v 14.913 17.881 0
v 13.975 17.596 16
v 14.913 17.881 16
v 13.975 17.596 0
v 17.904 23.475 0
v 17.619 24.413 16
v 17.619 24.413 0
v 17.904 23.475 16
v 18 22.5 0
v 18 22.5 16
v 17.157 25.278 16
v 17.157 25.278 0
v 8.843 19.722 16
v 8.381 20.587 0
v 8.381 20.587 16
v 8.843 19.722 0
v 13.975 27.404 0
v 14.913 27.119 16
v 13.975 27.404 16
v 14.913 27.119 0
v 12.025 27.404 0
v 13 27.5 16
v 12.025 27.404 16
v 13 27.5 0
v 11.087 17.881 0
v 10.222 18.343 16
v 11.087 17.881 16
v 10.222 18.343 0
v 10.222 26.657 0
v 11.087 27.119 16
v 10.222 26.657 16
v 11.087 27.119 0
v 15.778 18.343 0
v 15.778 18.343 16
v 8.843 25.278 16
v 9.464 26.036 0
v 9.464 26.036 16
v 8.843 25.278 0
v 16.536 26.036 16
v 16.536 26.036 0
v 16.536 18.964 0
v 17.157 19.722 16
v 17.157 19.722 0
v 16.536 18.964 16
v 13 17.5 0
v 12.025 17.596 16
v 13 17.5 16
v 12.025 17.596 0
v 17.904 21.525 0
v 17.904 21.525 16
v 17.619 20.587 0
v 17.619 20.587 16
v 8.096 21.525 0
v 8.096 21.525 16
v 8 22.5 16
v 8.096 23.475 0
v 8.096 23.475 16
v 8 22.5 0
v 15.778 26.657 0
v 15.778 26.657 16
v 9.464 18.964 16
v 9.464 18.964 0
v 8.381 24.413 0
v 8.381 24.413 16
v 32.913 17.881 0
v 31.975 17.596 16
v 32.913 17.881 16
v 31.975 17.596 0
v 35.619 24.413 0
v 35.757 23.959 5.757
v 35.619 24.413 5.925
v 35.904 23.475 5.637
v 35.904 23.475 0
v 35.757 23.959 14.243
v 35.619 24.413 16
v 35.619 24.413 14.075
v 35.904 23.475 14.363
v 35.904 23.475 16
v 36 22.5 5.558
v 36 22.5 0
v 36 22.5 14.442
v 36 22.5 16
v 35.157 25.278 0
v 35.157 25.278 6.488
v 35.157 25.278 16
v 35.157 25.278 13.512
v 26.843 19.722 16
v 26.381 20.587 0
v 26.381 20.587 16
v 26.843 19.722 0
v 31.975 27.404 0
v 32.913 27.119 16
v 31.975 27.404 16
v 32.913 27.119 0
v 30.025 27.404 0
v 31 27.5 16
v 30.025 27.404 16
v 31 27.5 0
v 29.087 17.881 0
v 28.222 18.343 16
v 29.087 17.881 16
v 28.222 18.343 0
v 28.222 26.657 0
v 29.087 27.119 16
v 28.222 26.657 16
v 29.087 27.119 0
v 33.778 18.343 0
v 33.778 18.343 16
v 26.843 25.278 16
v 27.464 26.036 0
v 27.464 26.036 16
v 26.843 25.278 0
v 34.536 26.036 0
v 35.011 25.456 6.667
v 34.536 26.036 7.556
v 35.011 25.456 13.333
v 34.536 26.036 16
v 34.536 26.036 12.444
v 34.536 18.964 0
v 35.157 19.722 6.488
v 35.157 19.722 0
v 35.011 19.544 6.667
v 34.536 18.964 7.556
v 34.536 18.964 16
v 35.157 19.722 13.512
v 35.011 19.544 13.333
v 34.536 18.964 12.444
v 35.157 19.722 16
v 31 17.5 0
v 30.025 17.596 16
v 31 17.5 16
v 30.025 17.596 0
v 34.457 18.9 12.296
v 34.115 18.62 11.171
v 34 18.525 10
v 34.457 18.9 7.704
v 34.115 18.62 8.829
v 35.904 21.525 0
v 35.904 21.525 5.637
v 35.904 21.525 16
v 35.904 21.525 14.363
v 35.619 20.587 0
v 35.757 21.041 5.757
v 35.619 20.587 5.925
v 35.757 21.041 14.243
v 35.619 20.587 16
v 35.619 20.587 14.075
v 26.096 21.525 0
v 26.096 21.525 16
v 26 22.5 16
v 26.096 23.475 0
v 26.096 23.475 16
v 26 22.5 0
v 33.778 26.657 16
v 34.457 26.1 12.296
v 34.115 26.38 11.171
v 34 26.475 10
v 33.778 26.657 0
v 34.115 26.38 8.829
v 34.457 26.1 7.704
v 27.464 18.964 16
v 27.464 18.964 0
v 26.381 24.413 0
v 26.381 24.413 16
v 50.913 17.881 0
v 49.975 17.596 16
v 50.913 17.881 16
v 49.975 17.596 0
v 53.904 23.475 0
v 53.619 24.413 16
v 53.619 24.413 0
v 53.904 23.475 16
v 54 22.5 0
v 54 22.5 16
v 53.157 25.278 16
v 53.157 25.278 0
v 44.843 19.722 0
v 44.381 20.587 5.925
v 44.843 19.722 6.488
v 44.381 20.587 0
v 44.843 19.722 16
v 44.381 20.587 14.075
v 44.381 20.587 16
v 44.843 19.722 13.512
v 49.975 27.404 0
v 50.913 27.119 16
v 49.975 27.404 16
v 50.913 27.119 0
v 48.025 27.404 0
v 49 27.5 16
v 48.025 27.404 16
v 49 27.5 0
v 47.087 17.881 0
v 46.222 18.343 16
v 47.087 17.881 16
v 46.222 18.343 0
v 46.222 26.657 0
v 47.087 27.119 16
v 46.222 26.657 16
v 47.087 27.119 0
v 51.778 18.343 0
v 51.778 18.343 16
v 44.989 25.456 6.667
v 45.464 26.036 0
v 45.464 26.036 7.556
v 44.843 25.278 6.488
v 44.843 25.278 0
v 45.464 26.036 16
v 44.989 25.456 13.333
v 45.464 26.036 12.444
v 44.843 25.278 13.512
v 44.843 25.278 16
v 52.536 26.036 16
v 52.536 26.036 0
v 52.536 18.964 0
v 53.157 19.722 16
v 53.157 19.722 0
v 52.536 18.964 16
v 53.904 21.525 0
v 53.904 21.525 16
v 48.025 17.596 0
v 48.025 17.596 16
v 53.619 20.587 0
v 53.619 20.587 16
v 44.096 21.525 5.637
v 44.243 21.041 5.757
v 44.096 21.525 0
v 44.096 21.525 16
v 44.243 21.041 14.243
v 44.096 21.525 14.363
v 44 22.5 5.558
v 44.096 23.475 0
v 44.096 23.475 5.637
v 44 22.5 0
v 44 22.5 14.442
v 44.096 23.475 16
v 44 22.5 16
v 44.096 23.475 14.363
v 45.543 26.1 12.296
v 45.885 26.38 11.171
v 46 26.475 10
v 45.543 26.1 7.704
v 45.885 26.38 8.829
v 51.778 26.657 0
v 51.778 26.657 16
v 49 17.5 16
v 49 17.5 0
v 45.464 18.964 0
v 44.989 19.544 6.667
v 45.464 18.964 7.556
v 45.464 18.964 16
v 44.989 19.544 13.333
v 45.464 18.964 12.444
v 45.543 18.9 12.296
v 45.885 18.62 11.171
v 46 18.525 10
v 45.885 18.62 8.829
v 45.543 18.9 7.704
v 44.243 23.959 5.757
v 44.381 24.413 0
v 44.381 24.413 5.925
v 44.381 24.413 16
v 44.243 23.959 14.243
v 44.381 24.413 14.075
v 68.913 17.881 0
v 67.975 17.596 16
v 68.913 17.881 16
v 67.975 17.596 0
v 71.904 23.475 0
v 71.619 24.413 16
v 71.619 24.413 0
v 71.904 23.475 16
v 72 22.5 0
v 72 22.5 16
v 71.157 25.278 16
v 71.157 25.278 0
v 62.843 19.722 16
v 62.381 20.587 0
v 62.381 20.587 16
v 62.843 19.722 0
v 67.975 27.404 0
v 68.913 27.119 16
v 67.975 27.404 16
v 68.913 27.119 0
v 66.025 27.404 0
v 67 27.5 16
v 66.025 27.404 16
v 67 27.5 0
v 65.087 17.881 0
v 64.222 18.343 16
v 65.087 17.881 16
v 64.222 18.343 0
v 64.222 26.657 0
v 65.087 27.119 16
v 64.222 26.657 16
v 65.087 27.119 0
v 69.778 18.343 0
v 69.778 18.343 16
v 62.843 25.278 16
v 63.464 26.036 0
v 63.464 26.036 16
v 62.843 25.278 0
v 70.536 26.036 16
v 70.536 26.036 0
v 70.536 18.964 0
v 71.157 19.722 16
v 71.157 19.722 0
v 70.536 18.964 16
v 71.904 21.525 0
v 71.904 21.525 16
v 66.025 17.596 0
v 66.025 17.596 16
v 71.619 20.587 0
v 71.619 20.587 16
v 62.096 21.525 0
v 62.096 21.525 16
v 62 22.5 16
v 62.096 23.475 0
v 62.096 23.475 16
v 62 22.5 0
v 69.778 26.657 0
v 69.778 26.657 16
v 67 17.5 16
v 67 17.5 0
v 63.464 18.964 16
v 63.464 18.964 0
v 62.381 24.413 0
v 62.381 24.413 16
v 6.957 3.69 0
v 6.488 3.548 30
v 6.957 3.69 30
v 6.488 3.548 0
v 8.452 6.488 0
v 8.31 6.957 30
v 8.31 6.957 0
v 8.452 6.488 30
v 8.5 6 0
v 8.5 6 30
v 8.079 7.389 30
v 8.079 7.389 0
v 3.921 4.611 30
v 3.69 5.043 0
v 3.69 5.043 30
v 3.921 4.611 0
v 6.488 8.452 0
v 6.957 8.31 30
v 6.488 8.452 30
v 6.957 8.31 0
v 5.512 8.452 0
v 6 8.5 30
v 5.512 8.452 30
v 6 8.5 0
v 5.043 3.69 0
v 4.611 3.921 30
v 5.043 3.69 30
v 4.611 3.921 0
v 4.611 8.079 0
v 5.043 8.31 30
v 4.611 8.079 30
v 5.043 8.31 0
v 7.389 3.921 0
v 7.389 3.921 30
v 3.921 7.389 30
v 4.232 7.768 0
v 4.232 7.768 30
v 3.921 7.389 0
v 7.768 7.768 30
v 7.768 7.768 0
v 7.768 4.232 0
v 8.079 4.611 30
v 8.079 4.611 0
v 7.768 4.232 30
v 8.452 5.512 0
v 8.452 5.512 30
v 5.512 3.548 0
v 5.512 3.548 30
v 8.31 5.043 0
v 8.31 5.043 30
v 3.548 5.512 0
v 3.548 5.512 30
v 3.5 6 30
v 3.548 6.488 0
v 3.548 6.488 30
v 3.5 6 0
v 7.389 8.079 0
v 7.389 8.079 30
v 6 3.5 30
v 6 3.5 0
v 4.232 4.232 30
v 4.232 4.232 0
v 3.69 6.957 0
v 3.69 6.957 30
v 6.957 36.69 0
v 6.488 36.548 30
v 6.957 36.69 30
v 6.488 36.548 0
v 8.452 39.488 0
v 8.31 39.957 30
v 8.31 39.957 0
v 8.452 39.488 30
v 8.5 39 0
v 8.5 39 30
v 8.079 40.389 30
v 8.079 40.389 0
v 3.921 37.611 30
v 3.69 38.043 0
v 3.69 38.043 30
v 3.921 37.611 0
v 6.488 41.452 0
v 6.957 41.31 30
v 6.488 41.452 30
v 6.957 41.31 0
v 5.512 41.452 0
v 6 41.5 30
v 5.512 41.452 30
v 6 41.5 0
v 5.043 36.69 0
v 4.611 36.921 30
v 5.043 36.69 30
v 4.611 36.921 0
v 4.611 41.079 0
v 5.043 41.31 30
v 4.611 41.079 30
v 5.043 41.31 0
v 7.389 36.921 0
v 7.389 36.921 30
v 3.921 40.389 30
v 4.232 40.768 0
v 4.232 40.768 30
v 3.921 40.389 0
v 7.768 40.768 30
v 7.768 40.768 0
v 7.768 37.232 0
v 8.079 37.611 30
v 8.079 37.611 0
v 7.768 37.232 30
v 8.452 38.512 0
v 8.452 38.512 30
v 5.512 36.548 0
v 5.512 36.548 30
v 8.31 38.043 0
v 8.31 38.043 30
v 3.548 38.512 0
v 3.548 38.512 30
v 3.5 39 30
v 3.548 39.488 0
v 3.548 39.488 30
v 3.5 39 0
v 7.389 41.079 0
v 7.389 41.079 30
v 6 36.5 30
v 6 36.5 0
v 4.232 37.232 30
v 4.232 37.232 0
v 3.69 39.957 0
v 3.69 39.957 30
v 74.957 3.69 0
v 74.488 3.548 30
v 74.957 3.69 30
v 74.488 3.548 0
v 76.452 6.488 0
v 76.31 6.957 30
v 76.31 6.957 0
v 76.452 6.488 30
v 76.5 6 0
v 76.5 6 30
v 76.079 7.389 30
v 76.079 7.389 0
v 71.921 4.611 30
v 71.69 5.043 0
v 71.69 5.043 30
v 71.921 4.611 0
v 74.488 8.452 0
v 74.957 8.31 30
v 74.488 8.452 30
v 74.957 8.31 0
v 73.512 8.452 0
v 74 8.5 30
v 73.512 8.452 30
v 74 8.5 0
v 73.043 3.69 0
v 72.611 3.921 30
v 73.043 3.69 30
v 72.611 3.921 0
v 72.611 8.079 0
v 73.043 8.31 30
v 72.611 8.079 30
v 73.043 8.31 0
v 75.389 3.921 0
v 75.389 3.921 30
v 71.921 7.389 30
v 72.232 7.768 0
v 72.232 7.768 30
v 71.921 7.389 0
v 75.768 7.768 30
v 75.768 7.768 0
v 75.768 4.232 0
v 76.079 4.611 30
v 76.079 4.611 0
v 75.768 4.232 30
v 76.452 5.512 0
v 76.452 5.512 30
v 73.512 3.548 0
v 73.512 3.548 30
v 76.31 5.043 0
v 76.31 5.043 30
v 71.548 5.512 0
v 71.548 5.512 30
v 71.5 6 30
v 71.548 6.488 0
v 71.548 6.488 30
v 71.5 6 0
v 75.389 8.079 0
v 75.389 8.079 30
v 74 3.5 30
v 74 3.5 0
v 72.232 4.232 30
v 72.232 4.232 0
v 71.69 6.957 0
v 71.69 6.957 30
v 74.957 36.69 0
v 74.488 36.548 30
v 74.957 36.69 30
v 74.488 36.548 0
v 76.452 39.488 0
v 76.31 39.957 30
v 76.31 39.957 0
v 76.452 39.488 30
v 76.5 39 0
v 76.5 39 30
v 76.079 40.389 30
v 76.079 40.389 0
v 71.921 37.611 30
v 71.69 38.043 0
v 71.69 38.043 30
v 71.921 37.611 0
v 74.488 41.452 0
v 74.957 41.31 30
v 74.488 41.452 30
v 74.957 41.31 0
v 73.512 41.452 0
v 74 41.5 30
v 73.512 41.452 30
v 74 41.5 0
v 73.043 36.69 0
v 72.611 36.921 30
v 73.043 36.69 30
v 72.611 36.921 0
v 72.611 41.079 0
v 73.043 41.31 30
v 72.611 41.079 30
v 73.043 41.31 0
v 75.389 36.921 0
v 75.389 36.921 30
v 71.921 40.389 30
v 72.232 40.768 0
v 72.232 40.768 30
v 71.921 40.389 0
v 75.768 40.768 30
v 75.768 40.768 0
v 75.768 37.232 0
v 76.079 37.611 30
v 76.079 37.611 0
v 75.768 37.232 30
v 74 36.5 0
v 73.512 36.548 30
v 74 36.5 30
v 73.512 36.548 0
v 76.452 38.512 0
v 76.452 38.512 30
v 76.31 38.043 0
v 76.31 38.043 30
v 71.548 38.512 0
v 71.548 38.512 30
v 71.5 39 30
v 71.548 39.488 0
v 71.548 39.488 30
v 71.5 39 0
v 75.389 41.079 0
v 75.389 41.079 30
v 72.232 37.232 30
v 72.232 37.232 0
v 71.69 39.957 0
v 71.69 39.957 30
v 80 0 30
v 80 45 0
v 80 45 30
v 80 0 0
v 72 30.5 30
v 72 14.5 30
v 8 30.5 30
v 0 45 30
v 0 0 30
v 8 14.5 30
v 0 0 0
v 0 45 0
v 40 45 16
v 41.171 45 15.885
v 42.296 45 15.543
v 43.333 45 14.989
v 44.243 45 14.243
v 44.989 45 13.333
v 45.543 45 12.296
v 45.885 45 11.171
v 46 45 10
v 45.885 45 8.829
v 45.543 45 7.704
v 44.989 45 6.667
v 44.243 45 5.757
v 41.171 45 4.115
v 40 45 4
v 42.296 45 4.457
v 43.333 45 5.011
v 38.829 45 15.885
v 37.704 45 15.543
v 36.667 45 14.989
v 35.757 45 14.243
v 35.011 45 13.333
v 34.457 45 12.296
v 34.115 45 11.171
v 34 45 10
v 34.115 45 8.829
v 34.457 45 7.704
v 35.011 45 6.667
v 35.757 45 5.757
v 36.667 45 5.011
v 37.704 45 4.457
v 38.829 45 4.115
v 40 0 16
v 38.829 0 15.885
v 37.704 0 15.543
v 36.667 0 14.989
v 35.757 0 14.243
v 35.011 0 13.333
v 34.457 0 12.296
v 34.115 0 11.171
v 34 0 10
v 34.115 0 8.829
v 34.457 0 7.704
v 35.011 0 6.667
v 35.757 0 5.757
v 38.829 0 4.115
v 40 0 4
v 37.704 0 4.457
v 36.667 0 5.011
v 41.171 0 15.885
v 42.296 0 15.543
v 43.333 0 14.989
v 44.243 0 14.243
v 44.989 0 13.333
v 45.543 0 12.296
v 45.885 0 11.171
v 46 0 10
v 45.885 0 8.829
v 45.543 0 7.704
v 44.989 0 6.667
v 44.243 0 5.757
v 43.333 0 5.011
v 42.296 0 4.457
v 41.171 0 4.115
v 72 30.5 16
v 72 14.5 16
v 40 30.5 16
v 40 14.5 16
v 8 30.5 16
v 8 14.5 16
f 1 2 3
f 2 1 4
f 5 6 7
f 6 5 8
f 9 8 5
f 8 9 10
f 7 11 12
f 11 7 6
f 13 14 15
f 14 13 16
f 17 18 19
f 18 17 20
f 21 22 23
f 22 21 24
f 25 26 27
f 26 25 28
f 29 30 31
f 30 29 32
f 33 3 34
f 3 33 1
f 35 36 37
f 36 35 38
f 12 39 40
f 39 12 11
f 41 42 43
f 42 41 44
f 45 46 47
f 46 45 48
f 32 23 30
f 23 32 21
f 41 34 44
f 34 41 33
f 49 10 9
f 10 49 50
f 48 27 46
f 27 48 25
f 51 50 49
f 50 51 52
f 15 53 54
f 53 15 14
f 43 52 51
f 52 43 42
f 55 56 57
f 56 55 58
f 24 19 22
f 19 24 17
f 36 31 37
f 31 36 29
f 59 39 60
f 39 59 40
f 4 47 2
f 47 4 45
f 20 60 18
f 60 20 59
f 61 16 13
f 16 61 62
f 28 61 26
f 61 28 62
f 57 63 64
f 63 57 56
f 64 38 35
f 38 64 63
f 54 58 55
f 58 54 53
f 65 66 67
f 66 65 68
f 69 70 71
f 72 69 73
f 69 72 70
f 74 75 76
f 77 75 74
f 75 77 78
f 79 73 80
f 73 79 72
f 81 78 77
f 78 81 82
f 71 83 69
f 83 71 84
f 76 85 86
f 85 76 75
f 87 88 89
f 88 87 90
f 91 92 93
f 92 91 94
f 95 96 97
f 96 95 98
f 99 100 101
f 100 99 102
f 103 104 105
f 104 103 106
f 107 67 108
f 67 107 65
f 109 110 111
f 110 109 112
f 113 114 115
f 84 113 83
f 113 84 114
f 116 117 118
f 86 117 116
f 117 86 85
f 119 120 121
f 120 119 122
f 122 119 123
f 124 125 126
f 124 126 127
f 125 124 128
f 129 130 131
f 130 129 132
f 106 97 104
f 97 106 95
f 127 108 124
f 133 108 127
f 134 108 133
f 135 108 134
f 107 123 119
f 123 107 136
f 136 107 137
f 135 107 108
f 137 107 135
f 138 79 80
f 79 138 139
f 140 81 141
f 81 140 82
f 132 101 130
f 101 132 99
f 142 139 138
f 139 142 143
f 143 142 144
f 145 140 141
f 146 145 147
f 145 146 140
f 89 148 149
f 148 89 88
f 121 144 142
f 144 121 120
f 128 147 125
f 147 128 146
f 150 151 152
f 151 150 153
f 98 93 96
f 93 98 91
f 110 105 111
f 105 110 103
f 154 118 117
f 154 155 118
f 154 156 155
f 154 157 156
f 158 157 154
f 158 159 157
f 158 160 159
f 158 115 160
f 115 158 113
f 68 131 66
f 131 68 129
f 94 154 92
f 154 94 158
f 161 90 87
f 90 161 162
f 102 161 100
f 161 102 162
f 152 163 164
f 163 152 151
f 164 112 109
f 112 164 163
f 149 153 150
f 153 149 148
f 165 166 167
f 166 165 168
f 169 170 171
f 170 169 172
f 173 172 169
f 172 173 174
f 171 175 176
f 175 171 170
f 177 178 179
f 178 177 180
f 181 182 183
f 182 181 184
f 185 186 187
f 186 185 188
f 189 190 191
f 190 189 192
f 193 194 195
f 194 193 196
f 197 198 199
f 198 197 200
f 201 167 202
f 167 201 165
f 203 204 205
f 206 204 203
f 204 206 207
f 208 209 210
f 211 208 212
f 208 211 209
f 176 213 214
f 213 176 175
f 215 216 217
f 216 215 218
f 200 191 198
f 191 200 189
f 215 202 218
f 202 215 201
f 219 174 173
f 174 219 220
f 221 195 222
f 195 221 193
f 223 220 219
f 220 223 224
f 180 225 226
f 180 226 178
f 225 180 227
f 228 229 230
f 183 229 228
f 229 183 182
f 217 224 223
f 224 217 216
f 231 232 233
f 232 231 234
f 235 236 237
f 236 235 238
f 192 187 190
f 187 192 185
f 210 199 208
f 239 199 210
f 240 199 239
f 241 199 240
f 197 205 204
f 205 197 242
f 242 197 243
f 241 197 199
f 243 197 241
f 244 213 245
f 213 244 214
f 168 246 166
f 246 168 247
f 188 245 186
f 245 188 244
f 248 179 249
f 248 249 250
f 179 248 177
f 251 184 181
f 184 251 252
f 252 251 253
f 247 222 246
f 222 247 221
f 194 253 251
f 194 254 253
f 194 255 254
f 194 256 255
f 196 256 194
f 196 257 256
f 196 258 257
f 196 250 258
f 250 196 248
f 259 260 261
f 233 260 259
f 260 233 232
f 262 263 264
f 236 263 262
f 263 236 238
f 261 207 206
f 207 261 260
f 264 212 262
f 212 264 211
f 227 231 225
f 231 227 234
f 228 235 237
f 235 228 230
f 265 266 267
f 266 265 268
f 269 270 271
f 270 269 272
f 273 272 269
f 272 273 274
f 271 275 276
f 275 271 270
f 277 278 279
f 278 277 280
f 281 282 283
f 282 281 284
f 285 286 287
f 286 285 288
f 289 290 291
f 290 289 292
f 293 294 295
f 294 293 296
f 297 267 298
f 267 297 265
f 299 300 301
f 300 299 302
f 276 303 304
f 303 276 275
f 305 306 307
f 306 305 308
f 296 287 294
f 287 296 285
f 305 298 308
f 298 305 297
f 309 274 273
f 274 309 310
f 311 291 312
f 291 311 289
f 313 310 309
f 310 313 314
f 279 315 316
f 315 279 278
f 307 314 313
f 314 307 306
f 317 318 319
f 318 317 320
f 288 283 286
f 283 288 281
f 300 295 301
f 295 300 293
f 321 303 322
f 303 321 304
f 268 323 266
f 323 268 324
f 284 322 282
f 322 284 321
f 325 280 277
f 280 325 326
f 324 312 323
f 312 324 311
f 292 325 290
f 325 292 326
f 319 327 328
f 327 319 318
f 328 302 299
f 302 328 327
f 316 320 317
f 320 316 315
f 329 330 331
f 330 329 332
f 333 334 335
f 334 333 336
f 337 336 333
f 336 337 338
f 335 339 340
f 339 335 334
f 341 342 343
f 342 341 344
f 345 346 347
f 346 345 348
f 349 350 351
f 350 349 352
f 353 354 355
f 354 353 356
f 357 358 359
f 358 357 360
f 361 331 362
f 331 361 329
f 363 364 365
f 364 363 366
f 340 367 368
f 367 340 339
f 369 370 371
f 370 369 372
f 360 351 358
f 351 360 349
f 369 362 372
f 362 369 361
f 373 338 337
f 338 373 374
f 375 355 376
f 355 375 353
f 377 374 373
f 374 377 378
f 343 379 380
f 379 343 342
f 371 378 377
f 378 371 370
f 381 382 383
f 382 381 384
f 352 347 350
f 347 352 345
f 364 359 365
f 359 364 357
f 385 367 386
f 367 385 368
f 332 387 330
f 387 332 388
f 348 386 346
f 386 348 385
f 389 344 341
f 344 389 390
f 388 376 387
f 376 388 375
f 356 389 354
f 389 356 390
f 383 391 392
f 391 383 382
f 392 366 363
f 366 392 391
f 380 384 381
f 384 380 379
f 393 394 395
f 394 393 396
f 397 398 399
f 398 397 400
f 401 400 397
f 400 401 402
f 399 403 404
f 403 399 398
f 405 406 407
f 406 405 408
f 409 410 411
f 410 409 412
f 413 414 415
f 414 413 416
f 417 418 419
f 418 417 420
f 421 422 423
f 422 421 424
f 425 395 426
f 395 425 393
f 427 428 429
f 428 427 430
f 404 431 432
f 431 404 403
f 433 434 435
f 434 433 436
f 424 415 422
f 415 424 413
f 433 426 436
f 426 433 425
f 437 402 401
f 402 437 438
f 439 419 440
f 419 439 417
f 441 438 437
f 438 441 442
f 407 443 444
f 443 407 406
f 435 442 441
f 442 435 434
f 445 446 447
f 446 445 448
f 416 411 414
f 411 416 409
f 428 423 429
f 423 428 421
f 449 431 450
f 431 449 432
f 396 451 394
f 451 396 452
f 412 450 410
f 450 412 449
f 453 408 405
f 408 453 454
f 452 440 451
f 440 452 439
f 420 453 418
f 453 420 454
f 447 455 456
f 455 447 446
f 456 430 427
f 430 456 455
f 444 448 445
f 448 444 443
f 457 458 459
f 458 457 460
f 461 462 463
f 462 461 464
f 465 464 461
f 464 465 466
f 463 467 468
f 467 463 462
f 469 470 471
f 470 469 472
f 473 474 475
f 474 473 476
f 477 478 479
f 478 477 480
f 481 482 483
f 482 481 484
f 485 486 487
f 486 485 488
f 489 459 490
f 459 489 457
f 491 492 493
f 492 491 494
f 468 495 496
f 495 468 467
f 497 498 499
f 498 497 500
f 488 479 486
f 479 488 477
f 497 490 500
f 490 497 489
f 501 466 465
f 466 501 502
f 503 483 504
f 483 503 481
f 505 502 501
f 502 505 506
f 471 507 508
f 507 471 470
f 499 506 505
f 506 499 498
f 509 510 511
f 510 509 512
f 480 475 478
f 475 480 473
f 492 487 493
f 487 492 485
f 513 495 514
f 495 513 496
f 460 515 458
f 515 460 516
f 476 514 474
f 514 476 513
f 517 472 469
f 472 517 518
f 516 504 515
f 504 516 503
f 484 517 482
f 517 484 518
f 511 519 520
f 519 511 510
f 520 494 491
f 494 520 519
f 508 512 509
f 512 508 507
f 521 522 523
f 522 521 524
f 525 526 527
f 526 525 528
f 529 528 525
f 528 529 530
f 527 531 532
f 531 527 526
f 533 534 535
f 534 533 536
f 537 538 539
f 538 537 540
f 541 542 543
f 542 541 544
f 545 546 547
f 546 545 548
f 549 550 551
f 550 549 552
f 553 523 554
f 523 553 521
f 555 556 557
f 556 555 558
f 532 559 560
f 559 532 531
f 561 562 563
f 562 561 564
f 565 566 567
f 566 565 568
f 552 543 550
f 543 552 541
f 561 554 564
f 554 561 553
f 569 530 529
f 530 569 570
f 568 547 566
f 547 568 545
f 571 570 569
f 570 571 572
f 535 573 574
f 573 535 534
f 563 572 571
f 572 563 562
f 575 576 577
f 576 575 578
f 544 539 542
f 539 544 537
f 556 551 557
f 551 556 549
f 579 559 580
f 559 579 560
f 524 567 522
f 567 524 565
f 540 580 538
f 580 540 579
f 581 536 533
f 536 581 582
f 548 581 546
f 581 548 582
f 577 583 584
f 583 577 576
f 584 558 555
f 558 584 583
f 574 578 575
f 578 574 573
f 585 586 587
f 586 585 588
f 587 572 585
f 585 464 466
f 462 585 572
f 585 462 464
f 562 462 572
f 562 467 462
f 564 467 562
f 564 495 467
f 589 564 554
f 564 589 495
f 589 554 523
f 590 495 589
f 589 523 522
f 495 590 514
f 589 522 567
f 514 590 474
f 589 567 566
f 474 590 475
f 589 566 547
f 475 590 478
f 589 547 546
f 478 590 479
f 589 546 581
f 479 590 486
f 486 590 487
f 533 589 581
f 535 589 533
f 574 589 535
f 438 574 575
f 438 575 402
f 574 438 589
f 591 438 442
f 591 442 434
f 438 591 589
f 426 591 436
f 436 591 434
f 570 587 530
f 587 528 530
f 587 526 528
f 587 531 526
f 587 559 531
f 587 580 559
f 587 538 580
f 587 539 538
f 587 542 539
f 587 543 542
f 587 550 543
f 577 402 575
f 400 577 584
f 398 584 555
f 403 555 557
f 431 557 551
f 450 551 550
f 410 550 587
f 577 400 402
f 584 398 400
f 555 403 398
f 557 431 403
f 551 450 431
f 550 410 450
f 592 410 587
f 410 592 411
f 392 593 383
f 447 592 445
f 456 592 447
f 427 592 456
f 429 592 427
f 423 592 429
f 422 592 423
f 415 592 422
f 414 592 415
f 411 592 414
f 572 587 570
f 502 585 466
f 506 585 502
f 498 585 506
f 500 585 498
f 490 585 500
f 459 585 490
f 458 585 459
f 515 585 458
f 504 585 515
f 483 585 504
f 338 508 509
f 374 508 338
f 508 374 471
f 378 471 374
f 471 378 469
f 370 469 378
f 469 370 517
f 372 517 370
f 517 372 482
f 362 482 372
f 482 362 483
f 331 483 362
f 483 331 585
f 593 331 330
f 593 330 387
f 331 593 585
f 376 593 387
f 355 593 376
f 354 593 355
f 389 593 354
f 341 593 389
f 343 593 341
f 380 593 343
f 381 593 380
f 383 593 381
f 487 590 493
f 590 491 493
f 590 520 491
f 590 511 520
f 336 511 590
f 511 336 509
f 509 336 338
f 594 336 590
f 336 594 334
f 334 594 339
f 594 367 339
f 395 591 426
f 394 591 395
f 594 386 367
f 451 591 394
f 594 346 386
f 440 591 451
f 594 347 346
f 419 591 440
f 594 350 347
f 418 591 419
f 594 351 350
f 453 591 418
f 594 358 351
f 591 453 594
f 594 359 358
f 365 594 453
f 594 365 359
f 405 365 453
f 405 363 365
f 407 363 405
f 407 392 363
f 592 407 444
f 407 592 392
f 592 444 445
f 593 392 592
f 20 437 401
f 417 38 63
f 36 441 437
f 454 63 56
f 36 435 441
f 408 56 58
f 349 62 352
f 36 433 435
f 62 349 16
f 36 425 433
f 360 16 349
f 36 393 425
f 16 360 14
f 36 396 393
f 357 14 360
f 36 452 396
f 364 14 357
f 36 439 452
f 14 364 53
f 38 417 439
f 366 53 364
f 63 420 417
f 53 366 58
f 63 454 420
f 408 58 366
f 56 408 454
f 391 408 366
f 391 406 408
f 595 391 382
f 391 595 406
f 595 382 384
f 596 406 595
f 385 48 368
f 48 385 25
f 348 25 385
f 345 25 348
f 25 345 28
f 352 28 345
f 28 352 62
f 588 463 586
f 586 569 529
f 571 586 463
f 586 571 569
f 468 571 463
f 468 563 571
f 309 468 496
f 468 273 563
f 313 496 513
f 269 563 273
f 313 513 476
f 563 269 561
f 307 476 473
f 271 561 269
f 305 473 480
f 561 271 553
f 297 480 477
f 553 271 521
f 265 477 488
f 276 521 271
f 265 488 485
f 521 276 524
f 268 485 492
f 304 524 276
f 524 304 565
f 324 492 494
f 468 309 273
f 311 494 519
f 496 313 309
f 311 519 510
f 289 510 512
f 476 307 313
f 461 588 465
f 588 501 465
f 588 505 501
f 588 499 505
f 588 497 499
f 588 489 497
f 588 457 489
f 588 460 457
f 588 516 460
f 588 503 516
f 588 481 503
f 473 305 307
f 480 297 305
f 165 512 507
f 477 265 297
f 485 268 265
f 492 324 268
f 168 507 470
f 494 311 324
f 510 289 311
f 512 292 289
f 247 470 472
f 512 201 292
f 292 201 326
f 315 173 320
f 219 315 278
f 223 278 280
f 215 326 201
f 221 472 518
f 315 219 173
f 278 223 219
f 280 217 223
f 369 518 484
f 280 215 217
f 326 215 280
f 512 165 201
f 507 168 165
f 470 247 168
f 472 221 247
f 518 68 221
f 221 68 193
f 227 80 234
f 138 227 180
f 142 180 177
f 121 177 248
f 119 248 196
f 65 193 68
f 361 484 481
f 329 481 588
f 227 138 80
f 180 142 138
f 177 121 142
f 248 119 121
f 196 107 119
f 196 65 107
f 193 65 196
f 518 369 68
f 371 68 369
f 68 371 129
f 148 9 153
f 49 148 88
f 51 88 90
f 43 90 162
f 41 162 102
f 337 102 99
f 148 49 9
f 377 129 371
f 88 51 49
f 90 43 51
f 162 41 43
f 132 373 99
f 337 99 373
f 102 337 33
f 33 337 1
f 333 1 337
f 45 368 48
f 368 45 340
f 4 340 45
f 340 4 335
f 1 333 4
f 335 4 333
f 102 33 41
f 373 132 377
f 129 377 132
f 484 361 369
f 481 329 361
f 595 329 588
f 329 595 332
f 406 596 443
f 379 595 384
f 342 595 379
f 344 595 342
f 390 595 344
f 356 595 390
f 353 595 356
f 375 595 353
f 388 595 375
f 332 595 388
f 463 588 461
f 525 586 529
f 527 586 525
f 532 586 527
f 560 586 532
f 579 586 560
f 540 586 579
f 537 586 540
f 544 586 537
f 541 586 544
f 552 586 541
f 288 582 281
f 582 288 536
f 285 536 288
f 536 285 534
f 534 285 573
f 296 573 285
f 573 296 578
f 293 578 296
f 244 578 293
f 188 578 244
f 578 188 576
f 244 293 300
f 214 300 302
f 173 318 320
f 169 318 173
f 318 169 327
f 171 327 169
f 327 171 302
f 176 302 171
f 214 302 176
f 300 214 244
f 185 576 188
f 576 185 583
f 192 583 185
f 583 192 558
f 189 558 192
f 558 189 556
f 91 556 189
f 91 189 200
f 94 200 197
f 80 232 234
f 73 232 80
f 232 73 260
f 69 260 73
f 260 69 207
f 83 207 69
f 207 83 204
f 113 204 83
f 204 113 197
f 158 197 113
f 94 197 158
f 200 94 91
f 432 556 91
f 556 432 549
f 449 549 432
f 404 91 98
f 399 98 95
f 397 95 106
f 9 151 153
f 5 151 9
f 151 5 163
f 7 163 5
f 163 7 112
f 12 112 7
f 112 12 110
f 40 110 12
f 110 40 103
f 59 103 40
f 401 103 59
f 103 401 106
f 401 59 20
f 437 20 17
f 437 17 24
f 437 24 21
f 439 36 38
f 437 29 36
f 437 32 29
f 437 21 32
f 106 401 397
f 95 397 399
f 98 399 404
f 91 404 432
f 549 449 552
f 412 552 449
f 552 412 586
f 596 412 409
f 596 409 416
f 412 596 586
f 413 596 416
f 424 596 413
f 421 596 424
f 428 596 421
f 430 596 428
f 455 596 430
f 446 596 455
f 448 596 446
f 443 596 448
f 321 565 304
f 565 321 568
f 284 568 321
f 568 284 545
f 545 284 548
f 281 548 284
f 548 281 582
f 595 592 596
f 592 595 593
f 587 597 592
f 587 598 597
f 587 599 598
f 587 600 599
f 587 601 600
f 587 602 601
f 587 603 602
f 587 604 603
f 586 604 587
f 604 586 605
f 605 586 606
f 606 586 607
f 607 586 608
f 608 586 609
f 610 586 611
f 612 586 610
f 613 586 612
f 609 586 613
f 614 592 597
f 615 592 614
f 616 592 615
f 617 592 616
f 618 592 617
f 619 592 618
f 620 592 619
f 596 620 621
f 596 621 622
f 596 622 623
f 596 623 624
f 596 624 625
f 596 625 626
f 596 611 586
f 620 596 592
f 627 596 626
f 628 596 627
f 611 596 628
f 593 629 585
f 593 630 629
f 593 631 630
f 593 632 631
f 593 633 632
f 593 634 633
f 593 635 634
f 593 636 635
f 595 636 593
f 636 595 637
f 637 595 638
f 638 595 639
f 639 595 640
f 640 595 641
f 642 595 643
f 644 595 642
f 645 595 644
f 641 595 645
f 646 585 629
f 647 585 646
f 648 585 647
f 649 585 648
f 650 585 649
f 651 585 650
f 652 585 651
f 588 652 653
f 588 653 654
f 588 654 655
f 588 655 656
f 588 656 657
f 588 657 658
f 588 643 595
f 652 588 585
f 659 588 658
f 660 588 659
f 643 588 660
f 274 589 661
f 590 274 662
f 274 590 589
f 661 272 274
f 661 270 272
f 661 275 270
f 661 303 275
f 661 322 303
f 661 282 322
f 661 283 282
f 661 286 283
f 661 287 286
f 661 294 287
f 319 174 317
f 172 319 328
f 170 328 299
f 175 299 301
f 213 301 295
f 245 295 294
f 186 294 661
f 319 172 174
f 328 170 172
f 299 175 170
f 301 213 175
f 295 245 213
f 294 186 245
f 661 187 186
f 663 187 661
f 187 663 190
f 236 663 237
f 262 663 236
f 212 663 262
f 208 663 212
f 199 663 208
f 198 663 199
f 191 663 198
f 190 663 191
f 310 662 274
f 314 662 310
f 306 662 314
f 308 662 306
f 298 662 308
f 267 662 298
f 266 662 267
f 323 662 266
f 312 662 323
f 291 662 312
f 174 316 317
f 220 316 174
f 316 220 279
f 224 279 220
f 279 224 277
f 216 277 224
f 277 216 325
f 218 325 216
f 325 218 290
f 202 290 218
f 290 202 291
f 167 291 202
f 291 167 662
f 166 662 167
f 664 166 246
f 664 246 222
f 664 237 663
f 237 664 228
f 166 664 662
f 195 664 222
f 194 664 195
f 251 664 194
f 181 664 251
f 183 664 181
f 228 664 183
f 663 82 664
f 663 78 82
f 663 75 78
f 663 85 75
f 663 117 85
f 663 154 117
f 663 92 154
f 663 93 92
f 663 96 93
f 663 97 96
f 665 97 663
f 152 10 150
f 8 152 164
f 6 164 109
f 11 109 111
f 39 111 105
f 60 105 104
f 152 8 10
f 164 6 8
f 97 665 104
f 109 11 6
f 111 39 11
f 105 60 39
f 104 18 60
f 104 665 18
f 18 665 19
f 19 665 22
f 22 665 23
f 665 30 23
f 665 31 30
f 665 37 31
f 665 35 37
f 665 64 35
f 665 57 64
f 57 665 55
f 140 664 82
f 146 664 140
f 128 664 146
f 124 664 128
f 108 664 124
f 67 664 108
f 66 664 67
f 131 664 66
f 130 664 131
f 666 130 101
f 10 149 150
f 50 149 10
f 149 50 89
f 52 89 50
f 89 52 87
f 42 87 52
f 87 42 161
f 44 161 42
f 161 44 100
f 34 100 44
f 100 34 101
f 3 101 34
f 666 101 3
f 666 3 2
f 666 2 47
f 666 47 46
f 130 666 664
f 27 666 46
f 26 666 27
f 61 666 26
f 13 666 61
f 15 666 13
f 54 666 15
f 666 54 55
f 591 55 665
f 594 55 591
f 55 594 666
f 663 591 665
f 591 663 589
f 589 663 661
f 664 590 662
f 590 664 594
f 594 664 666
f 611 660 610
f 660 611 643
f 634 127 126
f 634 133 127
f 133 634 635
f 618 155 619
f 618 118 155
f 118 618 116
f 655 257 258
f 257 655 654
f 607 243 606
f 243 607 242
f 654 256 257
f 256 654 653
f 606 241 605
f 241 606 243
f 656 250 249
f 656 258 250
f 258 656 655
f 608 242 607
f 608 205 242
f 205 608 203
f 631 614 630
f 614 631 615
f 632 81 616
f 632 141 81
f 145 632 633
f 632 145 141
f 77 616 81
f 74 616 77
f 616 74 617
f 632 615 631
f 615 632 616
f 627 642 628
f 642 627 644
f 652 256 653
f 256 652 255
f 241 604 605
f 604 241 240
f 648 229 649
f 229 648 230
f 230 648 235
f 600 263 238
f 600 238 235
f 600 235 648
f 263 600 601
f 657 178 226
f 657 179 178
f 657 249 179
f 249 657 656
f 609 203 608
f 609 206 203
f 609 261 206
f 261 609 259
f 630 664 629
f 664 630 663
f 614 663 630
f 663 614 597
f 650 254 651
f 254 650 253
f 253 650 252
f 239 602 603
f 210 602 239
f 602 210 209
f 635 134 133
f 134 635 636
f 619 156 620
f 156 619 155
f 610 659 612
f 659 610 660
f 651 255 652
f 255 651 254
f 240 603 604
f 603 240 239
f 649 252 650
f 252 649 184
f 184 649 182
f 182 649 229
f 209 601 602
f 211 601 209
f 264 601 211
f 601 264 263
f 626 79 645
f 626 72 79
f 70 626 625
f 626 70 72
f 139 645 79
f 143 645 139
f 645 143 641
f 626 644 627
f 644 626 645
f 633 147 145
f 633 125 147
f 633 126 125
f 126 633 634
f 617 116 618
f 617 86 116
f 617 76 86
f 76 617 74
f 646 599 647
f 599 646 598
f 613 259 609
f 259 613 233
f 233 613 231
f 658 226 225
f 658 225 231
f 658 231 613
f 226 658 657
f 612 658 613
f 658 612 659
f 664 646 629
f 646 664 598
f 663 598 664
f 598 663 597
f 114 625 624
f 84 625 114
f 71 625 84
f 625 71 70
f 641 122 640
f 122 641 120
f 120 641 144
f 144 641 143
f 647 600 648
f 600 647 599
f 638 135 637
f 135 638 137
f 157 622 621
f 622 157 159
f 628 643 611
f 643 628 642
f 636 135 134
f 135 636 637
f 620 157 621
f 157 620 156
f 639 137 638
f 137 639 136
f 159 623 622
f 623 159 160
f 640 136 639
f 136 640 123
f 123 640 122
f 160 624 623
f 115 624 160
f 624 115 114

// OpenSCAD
$fn = 32;

// ----------------------------------------------------------------------
// Manifold block: side_outlet manifold
// ----------------------------------------------------------------------

// --- parameters (mm) ---
block_l = 80;             // block length, X
block_w = 45;             // block width, Y
block_h = 30;             // block height, Z
port_d = 10;              // port bore diameter
port_pitch = 18;          // port pitch along X
gallery_d = 16;           // top gallery width, Y
gallery_depth = 14;       // gallery pocket depth
wall_p = 8;               // gallery end wall thickness, X
mnt_d = 5;                // mounting hole diameter
mnt_in = 6;               // mounting hole inset from the edges
out_d = 12;               // outlet bore diameter
out_z = 10;               // outlet axis height

n_ports = 4;  // ports in the row
port_x0 = (block_l - (n_ports - 1) * port_pitch) / 2;  // first port X

difference() {
  cube([block_l, block_w, block_h]);
  for (i = [0 : n_ports - 1])
    translate([port_x0 + i * port_pitch, block_w / 2, -1])
      cylinder(h = block_h + 2, d = port_d);
  translate([wall_p, block_w / 2 - gallery_d / 2, block_h - gallery_depth])
    cube([block_l - 2 * wall_p, gallery_d, gallery_depth + 1]);
  for (cx = [mnt_in, block_l - mnt_in])
    for (cy = [mnt_in, block_w - mnt_in])
      translate([cx, cy, -1]) cylinder(h = block_h + 2, d = mnt_d);
  translate([block_l / 2, -1, out_z]) rotate([-90, 0, 0])
    cylinder(h = block_w + 2, d = out_d);
}
